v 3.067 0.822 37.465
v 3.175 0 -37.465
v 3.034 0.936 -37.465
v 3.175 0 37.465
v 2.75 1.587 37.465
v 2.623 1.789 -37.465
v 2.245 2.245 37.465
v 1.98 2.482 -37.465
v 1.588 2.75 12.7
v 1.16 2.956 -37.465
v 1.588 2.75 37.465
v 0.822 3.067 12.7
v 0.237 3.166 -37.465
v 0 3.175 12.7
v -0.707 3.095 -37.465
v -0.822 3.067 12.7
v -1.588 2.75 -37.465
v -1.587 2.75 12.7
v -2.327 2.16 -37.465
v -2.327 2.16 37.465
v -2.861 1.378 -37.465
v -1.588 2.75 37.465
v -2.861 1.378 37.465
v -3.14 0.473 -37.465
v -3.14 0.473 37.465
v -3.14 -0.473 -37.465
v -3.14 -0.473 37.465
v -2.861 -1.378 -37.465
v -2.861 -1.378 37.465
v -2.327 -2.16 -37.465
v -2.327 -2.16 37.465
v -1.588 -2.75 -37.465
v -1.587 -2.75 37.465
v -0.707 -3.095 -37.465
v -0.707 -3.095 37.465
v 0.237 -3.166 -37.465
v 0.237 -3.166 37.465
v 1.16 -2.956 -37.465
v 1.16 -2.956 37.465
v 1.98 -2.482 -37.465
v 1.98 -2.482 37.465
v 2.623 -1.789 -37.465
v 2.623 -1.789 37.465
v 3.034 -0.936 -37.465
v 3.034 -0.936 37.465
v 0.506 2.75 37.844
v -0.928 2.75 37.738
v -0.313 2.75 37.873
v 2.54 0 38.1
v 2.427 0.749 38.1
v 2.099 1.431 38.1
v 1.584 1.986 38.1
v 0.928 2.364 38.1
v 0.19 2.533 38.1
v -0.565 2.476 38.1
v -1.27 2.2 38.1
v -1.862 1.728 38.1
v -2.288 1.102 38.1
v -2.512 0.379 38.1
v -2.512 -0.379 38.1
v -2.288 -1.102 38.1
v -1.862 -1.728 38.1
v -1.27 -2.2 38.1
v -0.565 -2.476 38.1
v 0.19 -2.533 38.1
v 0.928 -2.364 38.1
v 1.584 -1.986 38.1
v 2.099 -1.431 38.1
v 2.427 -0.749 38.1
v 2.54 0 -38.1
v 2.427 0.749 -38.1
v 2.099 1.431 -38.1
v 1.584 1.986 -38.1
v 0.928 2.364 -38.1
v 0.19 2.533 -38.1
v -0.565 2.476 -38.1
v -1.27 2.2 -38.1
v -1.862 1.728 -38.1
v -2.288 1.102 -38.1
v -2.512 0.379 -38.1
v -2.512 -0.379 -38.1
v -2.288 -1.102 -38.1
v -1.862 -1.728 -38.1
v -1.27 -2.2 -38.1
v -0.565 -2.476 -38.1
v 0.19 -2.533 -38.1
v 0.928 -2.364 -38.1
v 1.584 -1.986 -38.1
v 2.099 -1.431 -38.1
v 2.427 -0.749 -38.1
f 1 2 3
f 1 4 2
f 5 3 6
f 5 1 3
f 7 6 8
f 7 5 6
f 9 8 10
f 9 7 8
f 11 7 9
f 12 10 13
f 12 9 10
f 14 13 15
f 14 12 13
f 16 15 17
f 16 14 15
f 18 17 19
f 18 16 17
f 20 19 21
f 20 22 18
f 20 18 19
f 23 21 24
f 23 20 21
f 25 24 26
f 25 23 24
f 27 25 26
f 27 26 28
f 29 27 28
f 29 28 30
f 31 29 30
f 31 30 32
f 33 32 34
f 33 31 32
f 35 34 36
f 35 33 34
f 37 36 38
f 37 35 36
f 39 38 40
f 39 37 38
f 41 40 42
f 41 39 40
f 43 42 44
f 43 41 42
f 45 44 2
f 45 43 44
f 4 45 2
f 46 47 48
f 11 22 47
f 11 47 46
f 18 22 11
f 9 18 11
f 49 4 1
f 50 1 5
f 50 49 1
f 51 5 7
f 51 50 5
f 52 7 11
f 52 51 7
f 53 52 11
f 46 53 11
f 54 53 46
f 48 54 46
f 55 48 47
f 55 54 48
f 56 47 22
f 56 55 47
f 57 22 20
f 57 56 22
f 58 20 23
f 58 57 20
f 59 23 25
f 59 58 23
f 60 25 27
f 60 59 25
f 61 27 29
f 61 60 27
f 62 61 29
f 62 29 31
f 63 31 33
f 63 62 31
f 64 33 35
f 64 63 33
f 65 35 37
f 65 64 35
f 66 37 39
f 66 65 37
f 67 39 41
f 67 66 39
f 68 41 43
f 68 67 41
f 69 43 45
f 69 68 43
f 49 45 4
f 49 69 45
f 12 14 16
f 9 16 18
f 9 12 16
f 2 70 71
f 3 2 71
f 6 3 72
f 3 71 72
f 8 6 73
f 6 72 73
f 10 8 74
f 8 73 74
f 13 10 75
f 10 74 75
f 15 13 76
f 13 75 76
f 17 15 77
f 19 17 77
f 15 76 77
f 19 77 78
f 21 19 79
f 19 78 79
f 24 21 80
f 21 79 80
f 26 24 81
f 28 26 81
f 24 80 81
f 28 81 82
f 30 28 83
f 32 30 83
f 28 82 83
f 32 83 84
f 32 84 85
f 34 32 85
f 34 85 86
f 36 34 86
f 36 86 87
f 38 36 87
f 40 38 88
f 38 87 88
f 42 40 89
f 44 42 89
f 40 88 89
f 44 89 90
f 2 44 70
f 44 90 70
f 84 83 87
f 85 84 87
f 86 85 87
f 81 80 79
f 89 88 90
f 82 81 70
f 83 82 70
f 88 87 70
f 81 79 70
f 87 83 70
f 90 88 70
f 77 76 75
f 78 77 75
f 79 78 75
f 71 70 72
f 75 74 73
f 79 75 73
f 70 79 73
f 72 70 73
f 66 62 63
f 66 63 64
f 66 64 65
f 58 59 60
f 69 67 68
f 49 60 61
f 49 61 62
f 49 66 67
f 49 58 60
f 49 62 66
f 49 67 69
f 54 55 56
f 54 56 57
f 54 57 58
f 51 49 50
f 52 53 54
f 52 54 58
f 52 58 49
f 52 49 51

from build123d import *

# Parameters (mm, degrees)
SKETCH1_R      = 3.175
EXTRUDE1_DEPTH = 38.1
CHAMFER1_SIZE  = 0.635
EXTRUDE7_DEPTH = 26.4


with BuildPart() as part:
    # Sketch1 → Extrude1 (new body, symmetric)
    with BuildSketch(Plane.XY):
        Circle(SKETCH1_R)
    extrude(amount=EXTRUDE1_DEPTH, both=True)

    # Chamfer1
    chamfer1_edges = [part.edges().sort_by_distance(p)[0] for p in [
        (-3.175, 0, -38.1),
        (-3.175, 0, 38.1),
    ]]
    chamfer(chamfer1_edges, length=CHAMFER1_SIZE)

    # Sketch13 → Extrude7 (cut, through all)
    with BuildSketch(Plane.XY.offset(12.7)):
        with BuildLine():
            Line((-1.5875, 2.749630657), (1.5875, 2.749630657))
            ThreePointArc((1.5875, 2.749630657), (0, 3.175), (-1.5875, 2.749630657))
        make_face()
    extrude(amount=EXTRUDE7_DEPTH, mode=Mode.SUBTRACT)


solid = part.part
